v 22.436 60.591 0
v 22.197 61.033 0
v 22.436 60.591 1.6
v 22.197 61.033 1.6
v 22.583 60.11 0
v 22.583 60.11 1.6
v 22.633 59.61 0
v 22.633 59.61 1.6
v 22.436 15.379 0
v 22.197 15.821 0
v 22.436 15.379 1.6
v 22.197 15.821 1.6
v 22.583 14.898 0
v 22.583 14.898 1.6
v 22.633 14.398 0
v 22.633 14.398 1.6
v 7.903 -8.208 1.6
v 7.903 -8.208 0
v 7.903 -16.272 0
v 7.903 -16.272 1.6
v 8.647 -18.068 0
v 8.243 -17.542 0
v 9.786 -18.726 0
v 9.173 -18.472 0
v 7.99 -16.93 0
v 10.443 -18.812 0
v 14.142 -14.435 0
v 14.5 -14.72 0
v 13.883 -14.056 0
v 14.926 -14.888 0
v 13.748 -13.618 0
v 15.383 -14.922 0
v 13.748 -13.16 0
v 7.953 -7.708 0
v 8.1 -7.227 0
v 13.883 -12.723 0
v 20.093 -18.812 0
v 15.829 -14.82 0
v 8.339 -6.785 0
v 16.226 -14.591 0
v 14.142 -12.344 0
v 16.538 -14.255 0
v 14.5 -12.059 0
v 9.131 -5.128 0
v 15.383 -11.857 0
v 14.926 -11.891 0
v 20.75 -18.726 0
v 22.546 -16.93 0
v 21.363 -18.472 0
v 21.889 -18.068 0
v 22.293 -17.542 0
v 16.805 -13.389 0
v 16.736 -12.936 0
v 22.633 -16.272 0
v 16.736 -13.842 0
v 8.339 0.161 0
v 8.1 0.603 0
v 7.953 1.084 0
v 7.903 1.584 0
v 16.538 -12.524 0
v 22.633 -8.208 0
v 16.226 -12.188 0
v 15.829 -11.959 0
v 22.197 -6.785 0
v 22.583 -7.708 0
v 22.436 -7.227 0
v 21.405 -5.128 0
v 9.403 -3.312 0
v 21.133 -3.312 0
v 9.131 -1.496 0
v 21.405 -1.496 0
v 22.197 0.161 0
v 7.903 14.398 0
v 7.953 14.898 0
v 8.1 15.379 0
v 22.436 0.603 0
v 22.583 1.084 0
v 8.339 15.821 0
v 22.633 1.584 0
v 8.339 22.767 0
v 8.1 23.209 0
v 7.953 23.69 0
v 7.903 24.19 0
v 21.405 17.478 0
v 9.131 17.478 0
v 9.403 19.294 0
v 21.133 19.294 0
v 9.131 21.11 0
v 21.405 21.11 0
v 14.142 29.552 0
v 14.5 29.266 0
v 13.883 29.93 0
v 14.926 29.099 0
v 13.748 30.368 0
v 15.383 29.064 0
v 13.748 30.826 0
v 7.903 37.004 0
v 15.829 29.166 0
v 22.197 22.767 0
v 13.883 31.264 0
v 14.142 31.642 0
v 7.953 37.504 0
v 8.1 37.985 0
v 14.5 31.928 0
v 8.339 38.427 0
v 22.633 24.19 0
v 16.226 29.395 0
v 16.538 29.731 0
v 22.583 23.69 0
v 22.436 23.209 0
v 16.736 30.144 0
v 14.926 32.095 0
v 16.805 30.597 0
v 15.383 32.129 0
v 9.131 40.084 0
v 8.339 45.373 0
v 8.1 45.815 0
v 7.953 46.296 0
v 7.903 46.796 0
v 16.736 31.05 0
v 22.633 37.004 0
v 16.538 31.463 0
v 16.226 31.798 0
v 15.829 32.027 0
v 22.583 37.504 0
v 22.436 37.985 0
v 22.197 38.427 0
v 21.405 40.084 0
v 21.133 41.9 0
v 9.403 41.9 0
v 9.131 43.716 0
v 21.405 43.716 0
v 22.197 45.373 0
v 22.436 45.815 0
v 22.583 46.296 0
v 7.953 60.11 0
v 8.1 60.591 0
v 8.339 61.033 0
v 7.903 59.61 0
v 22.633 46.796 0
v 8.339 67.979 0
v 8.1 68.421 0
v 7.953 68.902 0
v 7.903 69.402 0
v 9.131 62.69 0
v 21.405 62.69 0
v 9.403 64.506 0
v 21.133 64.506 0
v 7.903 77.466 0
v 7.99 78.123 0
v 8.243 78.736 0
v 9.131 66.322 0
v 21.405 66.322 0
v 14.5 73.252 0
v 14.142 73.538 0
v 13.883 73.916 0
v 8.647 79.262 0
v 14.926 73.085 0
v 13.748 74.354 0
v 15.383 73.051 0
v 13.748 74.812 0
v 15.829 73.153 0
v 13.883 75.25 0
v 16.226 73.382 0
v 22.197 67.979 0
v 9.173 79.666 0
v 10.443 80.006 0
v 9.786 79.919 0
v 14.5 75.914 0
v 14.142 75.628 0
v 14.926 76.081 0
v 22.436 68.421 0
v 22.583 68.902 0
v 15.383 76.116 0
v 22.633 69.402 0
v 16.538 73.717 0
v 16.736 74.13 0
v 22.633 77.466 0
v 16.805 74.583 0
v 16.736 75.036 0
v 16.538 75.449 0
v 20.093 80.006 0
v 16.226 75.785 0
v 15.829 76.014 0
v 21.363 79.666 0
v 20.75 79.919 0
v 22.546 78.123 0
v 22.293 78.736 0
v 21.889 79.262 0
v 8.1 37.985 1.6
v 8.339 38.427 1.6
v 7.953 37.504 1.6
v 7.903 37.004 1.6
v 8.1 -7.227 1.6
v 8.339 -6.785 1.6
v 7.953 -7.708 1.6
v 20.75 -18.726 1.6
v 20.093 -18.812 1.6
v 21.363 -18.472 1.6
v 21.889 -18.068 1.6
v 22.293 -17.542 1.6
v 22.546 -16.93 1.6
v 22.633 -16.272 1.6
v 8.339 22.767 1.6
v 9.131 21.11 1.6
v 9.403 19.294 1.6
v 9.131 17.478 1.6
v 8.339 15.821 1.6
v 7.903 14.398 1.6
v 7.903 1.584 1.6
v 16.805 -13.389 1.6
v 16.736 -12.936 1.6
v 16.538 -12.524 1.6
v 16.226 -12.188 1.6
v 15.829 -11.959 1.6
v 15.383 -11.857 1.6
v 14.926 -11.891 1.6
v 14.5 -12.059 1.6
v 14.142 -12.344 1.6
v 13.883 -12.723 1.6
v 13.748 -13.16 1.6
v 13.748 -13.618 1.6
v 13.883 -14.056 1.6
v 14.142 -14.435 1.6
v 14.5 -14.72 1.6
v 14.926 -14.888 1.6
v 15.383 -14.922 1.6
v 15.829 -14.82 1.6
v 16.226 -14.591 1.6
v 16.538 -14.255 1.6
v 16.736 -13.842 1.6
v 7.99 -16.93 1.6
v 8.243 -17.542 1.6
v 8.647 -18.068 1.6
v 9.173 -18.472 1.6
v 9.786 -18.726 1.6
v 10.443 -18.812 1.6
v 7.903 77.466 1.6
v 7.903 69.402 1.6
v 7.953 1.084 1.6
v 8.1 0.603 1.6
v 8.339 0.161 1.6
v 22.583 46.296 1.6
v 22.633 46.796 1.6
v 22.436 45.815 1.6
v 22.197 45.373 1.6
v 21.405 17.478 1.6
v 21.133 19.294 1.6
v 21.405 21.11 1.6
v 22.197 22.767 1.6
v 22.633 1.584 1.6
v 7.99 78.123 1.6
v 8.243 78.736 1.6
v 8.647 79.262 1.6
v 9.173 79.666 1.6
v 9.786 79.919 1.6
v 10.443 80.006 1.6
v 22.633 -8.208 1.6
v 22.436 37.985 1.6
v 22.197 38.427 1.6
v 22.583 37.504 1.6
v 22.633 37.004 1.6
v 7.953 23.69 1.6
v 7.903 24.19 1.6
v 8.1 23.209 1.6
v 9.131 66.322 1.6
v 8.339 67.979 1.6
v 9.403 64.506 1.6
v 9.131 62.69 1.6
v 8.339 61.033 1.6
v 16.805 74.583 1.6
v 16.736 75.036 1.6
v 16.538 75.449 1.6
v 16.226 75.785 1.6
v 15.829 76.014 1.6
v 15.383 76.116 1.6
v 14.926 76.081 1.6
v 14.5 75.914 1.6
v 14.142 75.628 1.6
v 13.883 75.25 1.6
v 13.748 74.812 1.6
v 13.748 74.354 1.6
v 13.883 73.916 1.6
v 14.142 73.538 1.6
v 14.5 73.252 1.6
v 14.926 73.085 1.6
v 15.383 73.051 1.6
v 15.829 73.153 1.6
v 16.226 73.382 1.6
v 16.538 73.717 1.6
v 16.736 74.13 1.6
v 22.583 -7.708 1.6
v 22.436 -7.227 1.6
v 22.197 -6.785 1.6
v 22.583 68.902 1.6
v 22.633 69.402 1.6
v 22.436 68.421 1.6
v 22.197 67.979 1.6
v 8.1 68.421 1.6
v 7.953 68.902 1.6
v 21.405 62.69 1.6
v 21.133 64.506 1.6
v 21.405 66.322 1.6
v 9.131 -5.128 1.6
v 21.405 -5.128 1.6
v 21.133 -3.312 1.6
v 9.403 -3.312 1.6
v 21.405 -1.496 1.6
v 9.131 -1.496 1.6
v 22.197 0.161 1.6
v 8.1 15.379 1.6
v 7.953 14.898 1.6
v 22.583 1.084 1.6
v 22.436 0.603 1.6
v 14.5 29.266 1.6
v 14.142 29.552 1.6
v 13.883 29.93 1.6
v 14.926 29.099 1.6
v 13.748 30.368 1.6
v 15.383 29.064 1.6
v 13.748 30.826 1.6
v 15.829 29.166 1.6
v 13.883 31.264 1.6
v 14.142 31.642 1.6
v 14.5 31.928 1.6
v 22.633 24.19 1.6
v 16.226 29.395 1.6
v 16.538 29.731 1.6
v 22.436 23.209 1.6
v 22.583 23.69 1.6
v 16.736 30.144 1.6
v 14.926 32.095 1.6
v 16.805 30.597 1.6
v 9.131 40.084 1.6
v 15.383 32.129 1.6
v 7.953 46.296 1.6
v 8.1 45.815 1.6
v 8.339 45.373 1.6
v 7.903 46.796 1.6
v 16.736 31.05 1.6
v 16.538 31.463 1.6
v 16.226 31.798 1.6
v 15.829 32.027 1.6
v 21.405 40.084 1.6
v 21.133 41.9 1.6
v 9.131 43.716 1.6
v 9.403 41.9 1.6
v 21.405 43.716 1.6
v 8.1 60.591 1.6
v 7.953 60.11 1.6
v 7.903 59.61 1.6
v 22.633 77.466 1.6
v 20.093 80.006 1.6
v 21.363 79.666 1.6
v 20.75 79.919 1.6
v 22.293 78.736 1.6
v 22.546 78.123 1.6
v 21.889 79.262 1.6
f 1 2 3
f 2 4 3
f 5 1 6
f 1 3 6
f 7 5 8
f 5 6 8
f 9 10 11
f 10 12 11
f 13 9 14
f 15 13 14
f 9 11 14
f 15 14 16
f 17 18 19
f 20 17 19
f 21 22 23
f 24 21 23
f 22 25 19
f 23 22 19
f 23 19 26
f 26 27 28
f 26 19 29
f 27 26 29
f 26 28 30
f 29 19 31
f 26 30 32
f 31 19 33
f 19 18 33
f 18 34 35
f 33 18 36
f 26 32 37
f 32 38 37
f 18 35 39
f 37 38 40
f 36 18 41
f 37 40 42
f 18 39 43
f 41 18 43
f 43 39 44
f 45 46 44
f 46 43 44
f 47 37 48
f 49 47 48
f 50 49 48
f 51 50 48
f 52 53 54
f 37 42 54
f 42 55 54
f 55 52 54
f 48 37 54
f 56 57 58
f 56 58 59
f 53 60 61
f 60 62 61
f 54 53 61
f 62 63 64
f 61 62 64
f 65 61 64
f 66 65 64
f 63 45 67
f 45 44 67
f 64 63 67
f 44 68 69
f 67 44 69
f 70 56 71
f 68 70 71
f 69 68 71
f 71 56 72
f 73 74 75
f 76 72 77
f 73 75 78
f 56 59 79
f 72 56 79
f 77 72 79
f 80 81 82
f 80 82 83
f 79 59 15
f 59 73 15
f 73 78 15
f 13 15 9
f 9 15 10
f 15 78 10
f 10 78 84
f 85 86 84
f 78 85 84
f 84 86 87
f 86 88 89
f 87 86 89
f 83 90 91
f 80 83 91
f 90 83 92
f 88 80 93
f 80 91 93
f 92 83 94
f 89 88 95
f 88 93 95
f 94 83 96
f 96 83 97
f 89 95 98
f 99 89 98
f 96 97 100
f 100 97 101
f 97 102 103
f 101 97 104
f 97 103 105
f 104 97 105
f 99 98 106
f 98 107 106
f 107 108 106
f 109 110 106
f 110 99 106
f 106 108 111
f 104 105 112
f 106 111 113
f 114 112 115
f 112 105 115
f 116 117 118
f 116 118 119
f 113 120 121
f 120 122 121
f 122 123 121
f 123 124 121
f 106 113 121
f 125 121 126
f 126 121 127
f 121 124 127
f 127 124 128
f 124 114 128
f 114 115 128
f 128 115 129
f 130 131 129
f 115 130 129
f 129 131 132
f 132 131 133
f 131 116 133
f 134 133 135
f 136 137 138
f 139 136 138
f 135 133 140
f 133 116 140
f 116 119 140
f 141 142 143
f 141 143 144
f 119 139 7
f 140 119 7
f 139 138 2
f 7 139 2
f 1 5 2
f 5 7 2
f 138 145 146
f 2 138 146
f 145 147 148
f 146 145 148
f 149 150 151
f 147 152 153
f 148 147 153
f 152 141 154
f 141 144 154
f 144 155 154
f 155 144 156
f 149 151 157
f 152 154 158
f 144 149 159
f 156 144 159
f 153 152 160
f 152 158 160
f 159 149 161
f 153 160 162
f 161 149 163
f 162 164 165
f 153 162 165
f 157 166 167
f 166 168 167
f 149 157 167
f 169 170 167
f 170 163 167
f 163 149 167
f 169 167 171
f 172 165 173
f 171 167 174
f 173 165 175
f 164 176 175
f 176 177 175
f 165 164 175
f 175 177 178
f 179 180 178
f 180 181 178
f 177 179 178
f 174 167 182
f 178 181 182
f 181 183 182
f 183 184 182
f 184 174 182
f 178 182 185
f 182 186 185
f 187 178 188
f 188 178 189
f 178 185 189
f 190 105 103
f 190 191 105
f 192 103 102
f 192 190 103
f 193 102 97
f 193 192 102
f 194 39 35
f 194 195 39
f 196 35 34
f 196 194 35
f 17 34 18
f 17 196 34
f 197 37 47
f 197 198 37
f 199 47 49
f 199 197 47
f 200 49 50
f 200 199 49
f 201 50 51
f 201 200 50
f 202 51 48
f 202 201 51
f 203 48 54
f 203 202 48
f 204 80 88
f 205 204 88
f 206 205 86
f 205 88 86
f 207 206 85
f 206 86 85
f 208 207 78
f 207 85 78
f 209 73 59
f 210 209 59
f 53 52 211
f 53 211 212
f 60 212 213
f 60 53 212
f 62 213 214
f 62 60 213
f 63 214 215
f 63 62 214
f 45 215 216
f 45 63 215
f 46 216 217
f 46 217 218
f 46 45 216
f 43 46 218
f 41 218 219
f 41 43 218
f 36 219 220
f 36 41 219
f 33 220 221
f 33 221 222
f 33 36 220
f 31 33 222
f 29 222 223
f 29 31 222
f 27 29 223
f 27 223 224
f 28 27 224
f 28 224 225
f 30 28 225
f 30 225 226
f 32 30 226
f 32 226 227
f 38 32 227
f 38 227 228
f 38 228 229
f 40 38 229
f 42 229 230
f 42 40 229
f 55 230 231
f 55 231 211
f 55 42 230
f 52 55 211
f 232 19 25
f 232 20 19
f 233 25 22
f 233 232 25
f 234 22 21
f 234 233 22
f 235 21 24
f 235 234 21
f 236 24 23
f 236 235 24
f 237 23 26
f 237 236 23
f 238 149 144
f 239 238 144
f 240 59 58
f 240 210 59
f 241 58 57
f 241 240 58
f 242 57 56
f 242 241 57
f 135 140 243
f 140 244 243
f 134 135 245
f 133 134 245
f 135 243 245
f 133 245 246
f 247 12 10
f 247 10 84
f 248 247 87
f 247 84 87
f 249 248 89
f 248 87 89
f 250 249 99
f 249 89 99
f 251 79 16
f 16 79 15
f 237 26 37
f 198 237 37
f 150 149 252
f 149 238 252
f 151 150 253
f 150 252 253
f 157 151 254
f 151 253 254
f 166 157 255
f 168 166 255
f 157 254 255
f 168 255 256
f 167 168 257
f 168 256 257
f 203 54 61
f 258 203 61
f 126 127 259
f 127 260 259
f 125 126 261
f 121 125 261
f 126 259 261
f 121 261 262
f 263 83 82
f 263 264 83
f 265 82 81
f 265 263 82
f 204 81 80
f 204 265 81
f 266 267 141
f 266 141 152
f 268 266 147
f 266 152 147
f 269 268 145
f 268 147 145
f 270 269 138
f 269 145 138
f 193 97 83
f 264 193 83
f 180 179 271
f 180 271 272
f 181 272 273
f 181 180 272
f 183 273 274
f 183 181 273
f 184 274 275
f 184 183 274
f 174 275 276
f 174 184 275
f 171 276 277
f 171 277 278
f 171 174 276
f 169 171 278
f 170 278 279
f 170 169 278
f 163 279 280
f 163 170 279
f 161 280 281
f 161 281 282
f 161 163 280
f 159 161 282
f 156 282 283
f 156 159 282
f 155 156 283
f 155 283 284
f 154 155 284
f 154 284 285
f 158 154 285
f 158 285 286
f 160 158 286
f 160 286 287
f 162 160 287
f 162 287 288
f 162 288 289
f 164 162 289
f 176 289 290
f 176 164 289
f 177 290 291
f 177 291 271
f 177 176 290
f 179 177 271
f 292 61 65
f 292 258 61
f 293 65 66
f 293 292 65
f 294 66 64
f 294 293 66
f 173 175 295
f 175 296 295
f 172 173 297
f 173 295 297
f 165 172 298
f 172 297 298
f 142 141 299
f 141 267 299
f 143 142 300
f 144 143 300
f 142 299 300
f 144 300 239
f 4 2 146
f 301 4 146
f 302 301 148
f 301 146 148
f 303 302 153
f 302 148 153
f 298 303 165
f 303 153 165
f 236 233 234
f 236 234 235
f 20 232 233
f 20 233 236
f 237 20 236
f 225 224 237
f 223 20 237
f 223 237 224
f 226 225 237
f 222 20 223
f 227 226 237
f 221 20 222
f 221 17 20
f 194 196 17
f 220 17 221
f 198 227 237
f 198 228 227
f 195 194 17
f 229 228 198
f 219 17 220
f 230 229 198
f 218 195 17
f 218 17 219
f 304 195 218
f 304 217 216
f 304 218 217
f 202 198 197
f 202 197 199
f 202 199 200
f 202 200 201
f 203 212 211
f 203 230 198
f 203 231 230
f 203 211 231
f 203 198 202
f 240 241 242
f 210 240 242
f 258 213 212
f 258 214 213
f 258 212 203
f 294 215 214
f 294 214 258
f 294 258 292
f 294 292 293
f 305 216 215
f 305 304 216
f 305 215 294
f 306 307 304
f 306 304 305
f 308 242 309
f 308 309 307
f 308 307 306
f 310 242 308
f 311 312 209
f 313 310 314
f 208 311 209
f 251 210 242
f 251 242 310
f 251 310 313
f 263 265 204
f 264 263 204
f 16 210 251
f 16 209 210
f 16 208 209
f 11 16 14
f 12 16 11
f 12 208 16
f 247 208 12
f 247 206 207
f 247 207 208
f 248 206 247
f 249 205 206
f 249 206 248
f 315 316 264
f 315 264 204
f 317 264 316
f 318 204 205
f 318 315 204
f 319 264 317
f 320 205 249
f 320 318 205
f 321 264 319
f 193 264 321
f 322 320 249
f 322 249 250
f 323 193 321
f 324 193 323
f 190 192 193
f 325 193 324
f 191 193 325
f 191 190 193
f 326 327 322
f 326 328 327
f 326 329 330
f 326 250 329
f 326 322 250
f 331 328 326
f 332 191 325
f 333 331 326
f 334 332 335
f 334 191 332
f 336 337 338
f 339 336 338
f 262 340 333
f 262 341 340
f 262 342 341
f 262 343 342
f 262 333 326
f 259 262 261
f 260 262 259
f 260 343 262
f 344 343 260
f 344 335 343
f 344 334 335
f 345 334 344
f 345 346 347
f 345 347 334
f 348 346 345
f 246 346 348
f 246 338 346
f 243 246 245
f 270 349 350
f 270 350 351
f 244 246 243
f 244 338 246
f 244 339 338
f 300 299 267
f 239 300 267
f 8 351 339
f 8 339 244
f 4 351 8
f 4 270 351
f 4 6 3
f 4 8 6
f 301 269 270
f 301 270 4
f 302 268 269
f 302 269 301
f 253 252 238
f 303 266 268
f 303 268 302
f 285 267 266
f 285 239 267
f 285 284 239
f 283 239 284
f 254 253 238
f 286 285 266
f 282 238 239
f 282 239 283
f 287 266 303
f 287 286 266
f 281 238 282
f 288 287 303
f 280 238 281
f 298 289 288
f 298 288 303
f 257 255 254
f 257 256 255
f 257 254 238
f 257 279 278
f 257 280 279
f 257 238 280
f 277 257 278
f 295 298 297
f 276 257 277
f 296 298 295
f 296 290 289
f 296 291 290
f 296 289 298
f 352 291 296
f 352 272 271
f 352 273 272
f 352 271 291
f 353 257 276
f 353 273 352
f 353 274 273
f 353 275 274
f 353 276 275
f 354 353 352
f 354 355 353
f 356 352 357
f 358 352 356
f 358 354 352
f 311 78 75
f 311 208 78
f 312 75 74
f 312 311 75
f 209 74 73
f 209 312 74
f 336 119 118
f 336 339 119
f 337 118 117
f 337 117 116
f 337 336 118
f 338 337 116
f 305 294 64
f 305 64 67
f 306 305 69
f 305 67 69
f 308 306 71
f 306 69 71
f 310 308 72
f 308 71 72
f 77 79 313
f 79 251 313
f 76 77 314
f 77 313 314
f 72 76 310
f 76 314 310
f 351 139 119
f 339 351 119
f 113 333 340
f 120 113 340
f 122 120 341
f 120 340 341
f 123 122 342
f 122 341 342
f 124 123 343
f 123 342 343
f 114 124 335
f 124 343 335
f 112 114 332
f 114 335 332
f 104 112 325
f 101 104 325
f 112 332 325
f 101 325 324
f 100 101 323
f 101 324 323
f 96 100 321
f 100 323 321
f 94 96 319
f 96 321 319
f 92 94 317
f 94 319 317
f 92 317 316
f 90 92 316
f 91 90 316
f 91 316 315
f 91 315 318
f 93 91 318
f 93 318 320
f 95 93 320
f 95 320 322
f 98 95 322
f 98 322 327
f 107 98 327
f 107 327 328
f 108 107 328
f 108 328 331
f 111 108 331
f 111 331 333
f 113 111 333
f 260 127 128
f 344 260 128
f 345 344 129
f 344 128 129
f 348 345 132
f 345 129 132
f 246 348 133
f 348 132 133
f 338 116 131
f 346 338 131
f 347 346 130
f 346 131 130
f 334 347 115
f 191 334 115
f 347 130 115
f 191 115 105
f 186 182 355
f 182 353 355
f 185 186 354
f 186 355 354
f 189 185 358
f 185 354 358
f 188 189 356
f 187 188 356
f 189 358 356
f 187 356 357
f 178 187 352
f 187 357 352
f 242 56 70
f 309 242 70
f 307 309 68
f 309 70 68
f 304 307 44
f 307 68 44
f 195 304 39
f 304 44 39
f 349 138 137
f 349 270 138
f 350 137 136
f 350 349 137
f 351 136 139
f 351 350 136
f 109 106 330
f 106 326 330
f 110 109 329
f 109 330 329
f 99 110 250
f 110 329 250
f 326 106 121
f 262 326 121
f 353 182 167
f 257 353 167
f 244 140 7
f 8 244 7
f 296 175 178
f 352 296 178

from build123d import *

# Parameters (mm, degrees)
SKETCH1_R           = 1.5367
BOSS_EXTRUDE1_DEPTH = 1.6
FILLET1_R           = 2.54
SKETCH3_R           = 1.5367
CUT_EXTRUDE1_DEPTH  = 2.6


with BuildPart() as part:
    # Sketch1 → Boss-Extrude1 (new body)
    with BuildSketch(Plane.XY):
        with BuildLine():
            Line((7.903015948, 75.005885785), (7.903015948, 68.549399108))
            ThreePointArc((7.903015948, 68.549399108), (9.403015948, 64.505885785), (7.903015948, 60.462372462))
            Line((7.903015948, 60.462372462), (7.903015948, 45.943399108))
            ThreePointArc((7.903015948, 45.943399108), (9.403015948, 41.899885785), (7.903015948, 37.856372462))
            Line((7.903015948, 37.856372462), (7.903015948, 23.337399108))
            ThreePointArc((7.903015948, 23.337399108), (9.403015948, 19.293885785), (7.903015948, 15.250372462))
            Line((7.903015948, 15.250372462), (7.903015948, 0.731399108))
            ThreePointArc((7.903015948, 0.731399108), (9.403015948, -3.312114215), (7.903015948, -7.355627538))
            Line((7.903015948, -7.355627538), (7.903015948, -13.812114215))
            Line((7.903015948, -13.812114215), (7.903015948, -18.812254411))
            Line((7.903015948, -18.812254411), (22.633015952, -18.812254411))
            Line((22.633015952, -18.812254411), (22.633015952, -13.812114215))
            Line((22.633015952, -13.812114215), (22.633015952, -7.355627538))
            ThreePointArc((22.633015952, -7.355627538), (21.133015952, -3.312114215), (22.633015952, 0.731399108))
            Line((22.633015952, 0.731399108), (22.633015952, 15.250372462))
            ThreePointArc((22.633015952, 15.250372462), (21.133015952, 19.293885785), (22.633015952, 23.337399108))
            Line((22.633015952, 23.337399108), (22.633015952, 37.856372462))
            ThreePointArc((22.633015952, 37.856372462), (21.133015952, 41.899885785), (22.633015952, 45.943399108))
            Line((22.633015952, 45.943399108), (22.633015952, 60.462372462))
            ThreePointArc((22.633015952, 60.462372462), (21.133015952, 64.505885785), (22.633015952, 68.549399108))
            Line((22.633015952, 68.549399108), (22.633015952, 75.005885785))
            Line((22.633015952, 75.005885785), (22.633015952, 80.006025981))
            Line((22.633015952, 80.006025981), (7.903015948, 80.006025981))
            Line((7.903015948, 80.006025981), (7.903015948, 75.005885785))
        make_face()
        with Locations((15.26801595, 74.583125981)):
            Circle(SKETCH1_R, mode=Mode.SUBTRACT)
        with Locations((15.26801595, -13.389354411)):
            Circle(SKETCH1_R, mode=Mode.SUBTRACT)
    extrude(amount=BOSS_EXTRUDE1_DEPTH)

    # Fillet1
    fillet1_edges = [part.edges().sort_by_distance(p)[0] for p in [
        (7.903015948, 80.006025981, 0.8),
        (22.633015952, 80.006025981, 0.8),
        (22.633015952, 68.549399108, 0.8),
        (22.633015952, 60.462372462, 0.8),
        (22.633015952, 45.943399108, 0.8),
        (22.633015952, 37.856372462, 0.8),
        (22.633015952, 23.337399108, 0.8),
        (22.633015952, 15.250372462, 0.8),
        (22.633015952, 0.731399108, 0.8),
        (22.633015952, -7.355627538, 0.8),
        (22.633015952, -18.812254411, 0.8),
        (7.903015948, -18.812254411, 0.8),
        (7.903015948, -7.355627538, 0.8),
        (7.903015948, 0.731399108, 0.8),
        (7.903015948, 15.250372462, 0.8),
        (7.903015948, 23.337399108, 0.8),
        (7.903015948, 37.856372462, 0.8),
        (7.903015948, 45.943399108, 0.8),
        (7.903015948, 60.462372462, 0.8),
        (7.903015948, 68.549399108, 0.8),
    ]]
    fillet(fillet1_edges, radius=FILLET1_R)

    # Sketch3 → Cut-Extrude1 (cut, through all)
    with BuildSketch(Plane.XY.offset(1.6)):
        with Locations((15.26801595, 30.596885785)):
            Circle(SKETCH3_R)
    extrude(amount=-CUT_EXTRUDE1_DEPTH, mode=Mode.SUBTRACT)


solid = part.part
